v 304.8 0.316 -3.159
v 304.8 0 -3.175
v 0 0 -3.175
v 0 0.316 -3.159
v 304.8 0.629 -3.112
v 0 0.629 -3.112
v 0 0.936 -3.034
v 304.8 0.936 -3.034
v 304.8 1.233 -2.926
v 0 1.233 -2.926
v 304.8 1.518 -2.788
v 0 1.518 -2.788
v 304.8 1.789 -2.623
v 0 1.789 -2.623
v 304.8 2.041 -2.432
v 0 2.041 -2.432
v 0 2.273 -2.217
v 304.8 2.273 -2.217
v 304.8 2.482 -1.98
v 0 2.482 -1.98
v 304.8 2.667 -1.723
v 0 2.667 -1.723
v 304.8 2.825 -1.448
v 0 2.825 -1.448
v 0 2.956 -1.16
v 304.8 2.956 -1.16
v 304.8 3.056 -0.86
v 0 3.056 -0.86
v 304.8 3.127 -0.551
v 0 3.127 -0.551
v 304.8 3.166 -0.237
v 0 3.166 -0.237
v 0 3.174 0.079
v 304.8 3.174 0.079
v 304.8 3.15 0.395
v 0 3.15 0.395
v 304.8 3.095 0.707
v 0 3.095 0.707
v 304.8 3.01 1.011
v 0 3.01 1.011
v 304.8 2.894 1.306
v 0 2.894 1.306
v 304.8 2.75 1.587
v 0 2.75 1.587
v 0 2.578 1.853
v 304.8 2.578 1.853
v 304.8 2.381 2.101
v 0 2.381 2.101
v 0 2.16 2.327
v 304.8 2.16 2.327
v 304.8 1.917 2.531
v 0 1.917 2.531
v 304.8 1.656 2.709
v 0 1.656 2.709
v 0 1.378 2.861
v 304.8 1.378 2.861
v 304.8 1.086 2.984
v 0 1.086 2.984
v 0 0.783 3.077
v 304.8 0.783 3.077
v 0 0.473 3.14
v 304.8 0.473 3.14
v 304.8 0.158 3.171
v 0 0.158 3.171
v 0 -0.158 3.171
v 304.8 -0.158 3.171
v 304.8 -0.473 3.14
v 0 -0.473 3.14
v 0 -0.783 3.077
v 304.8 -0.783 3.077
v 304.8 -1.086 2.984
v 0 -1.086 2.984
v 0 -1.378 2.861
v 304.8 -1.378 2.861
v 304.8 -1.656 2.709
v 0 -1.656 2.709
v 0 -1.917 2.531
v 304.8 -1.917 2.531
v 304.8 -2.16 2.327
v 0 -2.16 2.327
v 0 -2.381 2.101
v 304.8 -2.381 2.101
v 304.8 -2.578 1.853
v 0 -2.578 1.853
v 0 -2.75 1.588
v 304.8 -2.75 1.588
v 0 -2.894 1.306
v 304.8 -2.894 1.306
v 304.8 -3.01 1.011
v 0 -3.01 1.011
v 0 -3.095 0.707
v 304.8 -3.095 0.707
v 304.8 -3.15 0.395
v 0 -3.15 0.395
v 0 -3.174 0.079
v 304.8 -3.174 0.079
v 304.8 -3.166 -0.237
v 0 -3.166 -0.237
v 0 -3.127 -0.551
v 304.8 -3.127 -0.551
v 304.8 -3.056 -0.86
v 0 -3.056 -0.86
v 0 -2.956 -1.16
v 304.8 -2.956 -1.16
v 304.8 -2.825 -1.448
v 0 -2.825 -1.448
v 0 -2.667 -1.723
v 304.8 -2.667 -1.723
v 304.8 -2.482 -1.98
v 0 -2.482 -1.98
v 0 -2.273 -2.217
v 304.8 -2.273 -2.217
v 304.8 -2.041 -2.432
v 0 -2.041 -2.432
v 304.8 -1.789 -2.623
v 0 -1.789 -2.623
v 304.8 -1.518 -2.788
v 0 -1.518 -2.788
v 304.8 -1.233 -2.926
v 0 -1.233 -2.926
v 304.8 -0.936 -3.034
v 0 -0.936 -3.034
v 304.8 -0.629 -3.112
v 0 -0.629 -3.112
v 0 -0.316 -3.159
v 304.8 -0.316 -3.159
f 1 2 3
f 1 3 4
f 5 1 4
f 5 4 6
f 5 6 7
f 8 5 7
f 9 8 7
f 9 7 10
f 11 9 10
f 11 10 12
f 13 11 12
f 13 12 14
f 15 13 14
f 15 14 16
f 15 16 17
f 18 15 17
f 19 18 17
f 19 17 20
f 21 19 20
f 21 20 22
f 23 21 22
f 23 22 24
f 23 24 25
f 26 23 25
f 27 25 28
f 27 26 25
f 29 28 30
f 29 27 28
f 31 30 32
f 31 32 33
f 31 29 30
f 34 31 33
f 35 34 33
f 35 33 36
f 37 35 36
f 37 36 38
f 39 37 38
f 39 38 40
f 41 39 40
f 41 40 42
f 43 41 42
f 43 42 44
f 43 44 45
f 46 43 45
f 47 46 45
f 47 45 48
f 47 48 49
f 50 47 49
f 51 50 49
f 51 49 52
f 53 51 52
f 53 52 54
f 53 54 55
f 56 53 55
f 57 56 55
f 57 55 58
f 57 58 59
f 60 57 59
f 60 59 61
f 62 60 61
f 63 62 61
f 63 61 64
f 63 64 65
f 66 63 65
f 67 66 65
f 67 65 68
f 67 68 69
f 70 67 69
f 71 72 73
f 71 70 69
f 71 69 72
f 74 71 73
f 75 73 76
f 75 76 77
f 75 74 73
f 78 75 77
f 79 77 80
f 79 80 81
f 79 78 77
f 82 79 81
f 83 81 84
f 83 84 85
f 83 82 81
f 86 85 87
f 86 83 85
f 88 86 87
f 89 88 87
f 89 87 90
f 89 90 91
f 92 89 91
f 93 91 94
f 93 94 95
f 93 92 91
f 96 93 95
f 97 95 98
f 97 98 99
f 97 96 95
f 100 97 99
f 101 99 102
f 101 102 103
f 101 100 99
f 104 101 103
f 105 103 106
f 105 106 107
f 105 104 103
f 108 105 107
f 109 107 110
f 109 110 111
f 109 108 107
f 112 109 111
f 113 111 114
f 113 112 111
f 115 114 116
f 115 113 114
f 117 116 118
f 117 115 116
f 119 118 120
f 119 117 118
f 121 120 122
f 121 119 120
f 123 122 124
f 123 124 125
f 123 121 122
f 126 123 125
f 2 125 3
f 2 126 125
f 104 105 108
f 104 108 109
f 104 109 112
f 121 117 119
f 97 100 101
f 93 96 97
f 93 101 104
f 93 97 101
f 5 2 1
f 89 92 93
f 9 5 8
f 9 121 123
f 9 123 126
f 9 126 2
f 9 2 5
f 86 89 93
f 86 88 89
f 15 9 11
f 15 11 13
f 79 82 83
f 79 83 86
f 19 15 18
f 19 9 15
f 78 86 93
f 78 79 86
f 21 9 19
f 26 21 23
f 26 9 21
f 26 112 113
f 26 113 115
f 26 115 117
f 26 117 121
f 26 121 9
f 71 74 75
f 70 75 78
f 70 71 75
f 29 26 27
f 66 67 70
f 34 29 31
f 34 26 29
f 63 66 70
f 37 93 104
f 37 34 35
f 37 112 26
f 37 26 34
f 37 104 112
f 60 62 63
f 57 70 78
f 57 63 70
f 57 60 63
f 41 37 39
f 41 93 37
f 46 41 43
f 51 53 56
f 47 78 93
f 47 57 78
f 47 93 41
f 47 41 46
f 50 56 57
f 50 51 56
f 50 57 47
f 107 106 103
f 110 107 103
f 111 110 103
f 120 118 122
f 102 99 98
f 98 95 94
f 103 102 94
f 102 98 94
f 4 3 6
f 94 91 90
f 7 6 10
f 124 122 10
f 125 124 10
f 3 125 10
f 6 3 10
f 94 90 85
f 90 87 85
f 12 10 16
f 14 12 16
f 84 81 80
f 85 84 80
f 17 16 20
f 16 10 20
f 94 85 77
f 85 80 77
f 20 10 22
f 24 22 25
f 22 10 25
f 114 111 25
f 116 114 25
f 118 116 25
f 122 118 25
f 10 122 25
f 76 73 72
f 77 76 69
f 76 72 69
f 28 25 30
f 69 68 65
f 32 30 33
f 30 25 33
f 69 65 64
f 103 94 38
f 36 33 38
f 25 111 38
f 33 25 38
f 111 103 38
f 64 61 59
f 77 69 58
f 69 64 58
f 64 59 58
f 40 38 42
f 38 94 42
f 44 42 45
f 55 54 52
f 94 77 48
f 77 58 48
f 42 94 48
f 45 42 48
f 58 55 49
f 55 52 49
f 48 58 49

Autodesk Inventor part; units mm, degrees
ref_plane "YZ Plane" through (0, 0, 0) normal (1, 0, 0) x (0, 1, 0)
ref_plane "XZ Plane" through (0, 0, 0) normal (0, 1, 0) x (-1, 0, 0)
ref_plane "XY Plane" through (0, 0, 0) normal (0, 0, 1) x (1, 0, 0)
sketch "Sketch1" plane through (0, 0, 0) normal (1, 0, 0) x (0, 1, 0)
  circle A0 centre (0, 0) radius 6.35
  dimension "d0" = 12.7
extrude "Extrusion1" add sketch "Sketch1" along normal blind 304.8
sketch "Sketch2" plane through (304.8, 0, 0) normal (1, 0, 0) x (0, 0, -1)
  circle A0 centre (0, 0) radius 4.7625
  circle A1 centre (0, 0) radius 6.35
  dimension "d3" = 9.525
extrude "Extrusion2" cut sketch "Sketch2" against normal blind 385.2875
sketch "Sketch3" plane through (304.8, 0, 0) normal (1, 0, 0) x (0, 0, -1)
  circle A0 centre (0, 0) radius 3.175
  circle A1 centre (0, 0) radius 4.7625 projected
  dimension "d6" = 6.35
extrude "Extrusion3" cut sketch "Sketch3" against normal blind 818.675
properties part number "Guide Shaft" material "Steel, Carbon"
